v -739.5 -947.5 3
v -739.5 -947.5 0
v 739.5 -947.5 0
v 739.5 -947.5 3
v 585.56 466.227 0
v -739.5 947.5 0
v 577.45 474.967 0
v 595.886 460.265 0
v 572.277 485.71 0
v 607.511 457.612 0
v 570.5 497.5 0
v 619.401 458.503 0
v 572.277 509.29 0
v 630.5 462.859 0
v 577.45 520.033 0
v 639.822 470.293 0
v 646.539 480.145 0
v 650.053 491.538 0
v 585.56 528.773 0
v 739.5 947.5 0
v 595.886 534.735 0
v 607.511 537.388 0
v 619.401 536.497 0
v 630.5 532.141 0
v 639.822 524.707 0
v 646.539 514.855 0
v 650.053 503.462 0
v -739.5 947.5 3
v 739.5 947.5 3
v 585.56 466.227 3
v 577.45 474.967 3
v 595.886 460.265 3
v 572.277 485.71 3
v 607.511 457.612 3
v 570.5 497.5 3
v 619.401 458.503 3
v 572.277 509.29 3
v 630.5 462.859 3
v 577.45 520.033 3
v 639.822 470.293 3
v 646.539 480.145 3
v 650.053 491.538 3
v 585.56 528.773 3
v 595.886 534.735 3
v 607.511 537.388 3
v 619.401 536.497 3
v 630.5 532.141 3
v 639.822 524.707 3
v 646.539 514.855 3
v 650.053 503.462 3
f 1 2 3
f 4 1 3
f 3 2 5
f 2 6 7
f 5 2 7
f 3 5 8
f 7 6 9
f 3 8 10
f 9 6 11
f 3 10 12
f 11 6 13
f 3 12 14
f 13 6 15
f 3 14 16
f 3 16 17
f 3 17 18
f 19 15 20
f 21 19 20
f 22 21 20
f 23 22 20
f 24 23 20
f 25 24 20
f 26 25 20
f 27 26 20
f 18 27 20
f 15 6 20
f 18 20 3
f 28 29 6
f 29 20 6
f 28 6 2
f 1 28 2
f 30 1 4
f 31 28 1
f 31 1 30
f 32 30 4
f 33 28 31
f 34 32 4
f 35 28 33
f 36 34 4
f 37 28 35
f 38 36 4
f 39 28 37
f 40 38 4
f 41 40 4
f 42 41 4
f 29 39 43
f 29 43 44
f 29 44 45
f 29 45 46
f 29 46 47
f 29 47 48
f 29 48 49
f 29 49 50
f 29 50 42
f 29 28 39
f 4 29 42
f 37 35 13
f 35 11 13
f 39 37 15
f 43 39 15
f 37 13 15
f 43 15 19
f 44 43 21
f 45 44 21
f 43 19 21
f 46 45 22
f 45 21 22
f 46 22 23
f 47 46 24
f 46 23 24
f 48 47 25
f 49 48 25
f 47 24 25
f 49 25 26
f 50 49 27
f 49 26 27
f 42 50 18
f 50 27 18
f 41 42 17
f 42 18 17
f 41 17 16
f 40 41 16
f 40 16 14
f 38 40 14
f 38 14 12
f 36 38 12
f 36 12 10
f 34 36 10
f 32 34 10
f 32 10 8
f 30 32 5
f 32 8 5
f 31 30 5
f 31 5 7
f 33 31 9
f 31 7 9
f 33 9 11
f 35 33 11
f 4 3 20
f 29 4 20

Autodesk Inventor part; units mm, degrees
ref_plane "YZ Plane" through (0, 0, 0) normal (1, 0, 0) x (0, 1, 0)
ref_plane "XZ Plane" through (0, 0, 0) normal (0, 1, 0) x (-1, 0, 0)
ref_plane "XY Plane" through (0, 0, 0) normal (0, 0, 1) x (1, 0, 0)
sketch "Sketch6" plane through (0, 0, 0) normal (0, 0, 1) x (1, 0, 0)
  line L0 (739.5, 947.5) -> (-739.5, 947.5)
  line L1 (-739.5, 947.5) -> (-739.5, -947.5)
  line L2 (-739.5, -947.5) -> (739.5, -947.5)
  line L3 (739.5, -947.5) -> (739.5, 947.5)
  line L4 (739.5, 947.5) -> (-739.5, -947.5) construction
  line L5 (-739.5, 947.5) -> (739.5, -947.5) construction
  point P0 (0, 0)
  dimension "d40" = 1479
  dimension "d41" = 1895
extrude "Plate5" add sketch "Sketch6" along normal blind 3
sketch "Sketch7" plane through (0, 0, 0) normal (0, 0, -1) x (-1, 0, 0)
  line L0 (-714.5, 922.5) -> (-514.5, 922.5) construction
  line L1 (-514.5, 922.5) -> (-514.5, 907.5) construction
  line L2 (-514.5, 907.5) -> (-714.5, 907.5) construction
  line L3 (-714.5, 907.5) -> (-714.5, 922.5) construction
  line L4 (-739.5, 947.5) -> (739.5, 947.5) projected
  line L5 (-739.5, -947.5) -> (-739.5, 947.5) projected
  point P0 (0, 0)
  dimension "d43" = 200
  dimension "d44" = 15
  dimension "d45" = 25
  dimension "d46" = 25
mark "Mark1"
sketch "Sketch8" plane through (739.5, 947.5, 0) normal (0, 0, -1) x (-1, 0, 0)
  circle A0 centre (129, -450) radius 40
  line L0 (1479, 0) -> (1479, -1895) projected
  line L1 (0, 0) -> (1479, 0) projected
  point P0 (739.5, -947.5)
  dimension "d47" = 80
  dimension "d48" = 1350
  dimension "d49" = 450
extrude "Extrusion3" cut sketch "Sketch8" against normal up to surface (3 mm away)
equation "\"d42\" = Thickness"
equation "\"BendReliefWidth\" = Thickness"
equation "\"BendReliefDepth\" = 0.5 * Thickness"
equation "\"CornerReliefSize\" = 4 * Thickness"
equation "\"MinimumRemnant\" = 2 * Thickness"
equation "\"TransitionRadius\" = BendRadius"
equation "\"JacobiRadiusSize\" = BendRadius"
equation "\"GapSize\" = Thickness"
equation "\"Thickness\" = 3"
equation "\"BendRadius\" = 5"
properties part number "BSH 046 back" material "09g2s"
